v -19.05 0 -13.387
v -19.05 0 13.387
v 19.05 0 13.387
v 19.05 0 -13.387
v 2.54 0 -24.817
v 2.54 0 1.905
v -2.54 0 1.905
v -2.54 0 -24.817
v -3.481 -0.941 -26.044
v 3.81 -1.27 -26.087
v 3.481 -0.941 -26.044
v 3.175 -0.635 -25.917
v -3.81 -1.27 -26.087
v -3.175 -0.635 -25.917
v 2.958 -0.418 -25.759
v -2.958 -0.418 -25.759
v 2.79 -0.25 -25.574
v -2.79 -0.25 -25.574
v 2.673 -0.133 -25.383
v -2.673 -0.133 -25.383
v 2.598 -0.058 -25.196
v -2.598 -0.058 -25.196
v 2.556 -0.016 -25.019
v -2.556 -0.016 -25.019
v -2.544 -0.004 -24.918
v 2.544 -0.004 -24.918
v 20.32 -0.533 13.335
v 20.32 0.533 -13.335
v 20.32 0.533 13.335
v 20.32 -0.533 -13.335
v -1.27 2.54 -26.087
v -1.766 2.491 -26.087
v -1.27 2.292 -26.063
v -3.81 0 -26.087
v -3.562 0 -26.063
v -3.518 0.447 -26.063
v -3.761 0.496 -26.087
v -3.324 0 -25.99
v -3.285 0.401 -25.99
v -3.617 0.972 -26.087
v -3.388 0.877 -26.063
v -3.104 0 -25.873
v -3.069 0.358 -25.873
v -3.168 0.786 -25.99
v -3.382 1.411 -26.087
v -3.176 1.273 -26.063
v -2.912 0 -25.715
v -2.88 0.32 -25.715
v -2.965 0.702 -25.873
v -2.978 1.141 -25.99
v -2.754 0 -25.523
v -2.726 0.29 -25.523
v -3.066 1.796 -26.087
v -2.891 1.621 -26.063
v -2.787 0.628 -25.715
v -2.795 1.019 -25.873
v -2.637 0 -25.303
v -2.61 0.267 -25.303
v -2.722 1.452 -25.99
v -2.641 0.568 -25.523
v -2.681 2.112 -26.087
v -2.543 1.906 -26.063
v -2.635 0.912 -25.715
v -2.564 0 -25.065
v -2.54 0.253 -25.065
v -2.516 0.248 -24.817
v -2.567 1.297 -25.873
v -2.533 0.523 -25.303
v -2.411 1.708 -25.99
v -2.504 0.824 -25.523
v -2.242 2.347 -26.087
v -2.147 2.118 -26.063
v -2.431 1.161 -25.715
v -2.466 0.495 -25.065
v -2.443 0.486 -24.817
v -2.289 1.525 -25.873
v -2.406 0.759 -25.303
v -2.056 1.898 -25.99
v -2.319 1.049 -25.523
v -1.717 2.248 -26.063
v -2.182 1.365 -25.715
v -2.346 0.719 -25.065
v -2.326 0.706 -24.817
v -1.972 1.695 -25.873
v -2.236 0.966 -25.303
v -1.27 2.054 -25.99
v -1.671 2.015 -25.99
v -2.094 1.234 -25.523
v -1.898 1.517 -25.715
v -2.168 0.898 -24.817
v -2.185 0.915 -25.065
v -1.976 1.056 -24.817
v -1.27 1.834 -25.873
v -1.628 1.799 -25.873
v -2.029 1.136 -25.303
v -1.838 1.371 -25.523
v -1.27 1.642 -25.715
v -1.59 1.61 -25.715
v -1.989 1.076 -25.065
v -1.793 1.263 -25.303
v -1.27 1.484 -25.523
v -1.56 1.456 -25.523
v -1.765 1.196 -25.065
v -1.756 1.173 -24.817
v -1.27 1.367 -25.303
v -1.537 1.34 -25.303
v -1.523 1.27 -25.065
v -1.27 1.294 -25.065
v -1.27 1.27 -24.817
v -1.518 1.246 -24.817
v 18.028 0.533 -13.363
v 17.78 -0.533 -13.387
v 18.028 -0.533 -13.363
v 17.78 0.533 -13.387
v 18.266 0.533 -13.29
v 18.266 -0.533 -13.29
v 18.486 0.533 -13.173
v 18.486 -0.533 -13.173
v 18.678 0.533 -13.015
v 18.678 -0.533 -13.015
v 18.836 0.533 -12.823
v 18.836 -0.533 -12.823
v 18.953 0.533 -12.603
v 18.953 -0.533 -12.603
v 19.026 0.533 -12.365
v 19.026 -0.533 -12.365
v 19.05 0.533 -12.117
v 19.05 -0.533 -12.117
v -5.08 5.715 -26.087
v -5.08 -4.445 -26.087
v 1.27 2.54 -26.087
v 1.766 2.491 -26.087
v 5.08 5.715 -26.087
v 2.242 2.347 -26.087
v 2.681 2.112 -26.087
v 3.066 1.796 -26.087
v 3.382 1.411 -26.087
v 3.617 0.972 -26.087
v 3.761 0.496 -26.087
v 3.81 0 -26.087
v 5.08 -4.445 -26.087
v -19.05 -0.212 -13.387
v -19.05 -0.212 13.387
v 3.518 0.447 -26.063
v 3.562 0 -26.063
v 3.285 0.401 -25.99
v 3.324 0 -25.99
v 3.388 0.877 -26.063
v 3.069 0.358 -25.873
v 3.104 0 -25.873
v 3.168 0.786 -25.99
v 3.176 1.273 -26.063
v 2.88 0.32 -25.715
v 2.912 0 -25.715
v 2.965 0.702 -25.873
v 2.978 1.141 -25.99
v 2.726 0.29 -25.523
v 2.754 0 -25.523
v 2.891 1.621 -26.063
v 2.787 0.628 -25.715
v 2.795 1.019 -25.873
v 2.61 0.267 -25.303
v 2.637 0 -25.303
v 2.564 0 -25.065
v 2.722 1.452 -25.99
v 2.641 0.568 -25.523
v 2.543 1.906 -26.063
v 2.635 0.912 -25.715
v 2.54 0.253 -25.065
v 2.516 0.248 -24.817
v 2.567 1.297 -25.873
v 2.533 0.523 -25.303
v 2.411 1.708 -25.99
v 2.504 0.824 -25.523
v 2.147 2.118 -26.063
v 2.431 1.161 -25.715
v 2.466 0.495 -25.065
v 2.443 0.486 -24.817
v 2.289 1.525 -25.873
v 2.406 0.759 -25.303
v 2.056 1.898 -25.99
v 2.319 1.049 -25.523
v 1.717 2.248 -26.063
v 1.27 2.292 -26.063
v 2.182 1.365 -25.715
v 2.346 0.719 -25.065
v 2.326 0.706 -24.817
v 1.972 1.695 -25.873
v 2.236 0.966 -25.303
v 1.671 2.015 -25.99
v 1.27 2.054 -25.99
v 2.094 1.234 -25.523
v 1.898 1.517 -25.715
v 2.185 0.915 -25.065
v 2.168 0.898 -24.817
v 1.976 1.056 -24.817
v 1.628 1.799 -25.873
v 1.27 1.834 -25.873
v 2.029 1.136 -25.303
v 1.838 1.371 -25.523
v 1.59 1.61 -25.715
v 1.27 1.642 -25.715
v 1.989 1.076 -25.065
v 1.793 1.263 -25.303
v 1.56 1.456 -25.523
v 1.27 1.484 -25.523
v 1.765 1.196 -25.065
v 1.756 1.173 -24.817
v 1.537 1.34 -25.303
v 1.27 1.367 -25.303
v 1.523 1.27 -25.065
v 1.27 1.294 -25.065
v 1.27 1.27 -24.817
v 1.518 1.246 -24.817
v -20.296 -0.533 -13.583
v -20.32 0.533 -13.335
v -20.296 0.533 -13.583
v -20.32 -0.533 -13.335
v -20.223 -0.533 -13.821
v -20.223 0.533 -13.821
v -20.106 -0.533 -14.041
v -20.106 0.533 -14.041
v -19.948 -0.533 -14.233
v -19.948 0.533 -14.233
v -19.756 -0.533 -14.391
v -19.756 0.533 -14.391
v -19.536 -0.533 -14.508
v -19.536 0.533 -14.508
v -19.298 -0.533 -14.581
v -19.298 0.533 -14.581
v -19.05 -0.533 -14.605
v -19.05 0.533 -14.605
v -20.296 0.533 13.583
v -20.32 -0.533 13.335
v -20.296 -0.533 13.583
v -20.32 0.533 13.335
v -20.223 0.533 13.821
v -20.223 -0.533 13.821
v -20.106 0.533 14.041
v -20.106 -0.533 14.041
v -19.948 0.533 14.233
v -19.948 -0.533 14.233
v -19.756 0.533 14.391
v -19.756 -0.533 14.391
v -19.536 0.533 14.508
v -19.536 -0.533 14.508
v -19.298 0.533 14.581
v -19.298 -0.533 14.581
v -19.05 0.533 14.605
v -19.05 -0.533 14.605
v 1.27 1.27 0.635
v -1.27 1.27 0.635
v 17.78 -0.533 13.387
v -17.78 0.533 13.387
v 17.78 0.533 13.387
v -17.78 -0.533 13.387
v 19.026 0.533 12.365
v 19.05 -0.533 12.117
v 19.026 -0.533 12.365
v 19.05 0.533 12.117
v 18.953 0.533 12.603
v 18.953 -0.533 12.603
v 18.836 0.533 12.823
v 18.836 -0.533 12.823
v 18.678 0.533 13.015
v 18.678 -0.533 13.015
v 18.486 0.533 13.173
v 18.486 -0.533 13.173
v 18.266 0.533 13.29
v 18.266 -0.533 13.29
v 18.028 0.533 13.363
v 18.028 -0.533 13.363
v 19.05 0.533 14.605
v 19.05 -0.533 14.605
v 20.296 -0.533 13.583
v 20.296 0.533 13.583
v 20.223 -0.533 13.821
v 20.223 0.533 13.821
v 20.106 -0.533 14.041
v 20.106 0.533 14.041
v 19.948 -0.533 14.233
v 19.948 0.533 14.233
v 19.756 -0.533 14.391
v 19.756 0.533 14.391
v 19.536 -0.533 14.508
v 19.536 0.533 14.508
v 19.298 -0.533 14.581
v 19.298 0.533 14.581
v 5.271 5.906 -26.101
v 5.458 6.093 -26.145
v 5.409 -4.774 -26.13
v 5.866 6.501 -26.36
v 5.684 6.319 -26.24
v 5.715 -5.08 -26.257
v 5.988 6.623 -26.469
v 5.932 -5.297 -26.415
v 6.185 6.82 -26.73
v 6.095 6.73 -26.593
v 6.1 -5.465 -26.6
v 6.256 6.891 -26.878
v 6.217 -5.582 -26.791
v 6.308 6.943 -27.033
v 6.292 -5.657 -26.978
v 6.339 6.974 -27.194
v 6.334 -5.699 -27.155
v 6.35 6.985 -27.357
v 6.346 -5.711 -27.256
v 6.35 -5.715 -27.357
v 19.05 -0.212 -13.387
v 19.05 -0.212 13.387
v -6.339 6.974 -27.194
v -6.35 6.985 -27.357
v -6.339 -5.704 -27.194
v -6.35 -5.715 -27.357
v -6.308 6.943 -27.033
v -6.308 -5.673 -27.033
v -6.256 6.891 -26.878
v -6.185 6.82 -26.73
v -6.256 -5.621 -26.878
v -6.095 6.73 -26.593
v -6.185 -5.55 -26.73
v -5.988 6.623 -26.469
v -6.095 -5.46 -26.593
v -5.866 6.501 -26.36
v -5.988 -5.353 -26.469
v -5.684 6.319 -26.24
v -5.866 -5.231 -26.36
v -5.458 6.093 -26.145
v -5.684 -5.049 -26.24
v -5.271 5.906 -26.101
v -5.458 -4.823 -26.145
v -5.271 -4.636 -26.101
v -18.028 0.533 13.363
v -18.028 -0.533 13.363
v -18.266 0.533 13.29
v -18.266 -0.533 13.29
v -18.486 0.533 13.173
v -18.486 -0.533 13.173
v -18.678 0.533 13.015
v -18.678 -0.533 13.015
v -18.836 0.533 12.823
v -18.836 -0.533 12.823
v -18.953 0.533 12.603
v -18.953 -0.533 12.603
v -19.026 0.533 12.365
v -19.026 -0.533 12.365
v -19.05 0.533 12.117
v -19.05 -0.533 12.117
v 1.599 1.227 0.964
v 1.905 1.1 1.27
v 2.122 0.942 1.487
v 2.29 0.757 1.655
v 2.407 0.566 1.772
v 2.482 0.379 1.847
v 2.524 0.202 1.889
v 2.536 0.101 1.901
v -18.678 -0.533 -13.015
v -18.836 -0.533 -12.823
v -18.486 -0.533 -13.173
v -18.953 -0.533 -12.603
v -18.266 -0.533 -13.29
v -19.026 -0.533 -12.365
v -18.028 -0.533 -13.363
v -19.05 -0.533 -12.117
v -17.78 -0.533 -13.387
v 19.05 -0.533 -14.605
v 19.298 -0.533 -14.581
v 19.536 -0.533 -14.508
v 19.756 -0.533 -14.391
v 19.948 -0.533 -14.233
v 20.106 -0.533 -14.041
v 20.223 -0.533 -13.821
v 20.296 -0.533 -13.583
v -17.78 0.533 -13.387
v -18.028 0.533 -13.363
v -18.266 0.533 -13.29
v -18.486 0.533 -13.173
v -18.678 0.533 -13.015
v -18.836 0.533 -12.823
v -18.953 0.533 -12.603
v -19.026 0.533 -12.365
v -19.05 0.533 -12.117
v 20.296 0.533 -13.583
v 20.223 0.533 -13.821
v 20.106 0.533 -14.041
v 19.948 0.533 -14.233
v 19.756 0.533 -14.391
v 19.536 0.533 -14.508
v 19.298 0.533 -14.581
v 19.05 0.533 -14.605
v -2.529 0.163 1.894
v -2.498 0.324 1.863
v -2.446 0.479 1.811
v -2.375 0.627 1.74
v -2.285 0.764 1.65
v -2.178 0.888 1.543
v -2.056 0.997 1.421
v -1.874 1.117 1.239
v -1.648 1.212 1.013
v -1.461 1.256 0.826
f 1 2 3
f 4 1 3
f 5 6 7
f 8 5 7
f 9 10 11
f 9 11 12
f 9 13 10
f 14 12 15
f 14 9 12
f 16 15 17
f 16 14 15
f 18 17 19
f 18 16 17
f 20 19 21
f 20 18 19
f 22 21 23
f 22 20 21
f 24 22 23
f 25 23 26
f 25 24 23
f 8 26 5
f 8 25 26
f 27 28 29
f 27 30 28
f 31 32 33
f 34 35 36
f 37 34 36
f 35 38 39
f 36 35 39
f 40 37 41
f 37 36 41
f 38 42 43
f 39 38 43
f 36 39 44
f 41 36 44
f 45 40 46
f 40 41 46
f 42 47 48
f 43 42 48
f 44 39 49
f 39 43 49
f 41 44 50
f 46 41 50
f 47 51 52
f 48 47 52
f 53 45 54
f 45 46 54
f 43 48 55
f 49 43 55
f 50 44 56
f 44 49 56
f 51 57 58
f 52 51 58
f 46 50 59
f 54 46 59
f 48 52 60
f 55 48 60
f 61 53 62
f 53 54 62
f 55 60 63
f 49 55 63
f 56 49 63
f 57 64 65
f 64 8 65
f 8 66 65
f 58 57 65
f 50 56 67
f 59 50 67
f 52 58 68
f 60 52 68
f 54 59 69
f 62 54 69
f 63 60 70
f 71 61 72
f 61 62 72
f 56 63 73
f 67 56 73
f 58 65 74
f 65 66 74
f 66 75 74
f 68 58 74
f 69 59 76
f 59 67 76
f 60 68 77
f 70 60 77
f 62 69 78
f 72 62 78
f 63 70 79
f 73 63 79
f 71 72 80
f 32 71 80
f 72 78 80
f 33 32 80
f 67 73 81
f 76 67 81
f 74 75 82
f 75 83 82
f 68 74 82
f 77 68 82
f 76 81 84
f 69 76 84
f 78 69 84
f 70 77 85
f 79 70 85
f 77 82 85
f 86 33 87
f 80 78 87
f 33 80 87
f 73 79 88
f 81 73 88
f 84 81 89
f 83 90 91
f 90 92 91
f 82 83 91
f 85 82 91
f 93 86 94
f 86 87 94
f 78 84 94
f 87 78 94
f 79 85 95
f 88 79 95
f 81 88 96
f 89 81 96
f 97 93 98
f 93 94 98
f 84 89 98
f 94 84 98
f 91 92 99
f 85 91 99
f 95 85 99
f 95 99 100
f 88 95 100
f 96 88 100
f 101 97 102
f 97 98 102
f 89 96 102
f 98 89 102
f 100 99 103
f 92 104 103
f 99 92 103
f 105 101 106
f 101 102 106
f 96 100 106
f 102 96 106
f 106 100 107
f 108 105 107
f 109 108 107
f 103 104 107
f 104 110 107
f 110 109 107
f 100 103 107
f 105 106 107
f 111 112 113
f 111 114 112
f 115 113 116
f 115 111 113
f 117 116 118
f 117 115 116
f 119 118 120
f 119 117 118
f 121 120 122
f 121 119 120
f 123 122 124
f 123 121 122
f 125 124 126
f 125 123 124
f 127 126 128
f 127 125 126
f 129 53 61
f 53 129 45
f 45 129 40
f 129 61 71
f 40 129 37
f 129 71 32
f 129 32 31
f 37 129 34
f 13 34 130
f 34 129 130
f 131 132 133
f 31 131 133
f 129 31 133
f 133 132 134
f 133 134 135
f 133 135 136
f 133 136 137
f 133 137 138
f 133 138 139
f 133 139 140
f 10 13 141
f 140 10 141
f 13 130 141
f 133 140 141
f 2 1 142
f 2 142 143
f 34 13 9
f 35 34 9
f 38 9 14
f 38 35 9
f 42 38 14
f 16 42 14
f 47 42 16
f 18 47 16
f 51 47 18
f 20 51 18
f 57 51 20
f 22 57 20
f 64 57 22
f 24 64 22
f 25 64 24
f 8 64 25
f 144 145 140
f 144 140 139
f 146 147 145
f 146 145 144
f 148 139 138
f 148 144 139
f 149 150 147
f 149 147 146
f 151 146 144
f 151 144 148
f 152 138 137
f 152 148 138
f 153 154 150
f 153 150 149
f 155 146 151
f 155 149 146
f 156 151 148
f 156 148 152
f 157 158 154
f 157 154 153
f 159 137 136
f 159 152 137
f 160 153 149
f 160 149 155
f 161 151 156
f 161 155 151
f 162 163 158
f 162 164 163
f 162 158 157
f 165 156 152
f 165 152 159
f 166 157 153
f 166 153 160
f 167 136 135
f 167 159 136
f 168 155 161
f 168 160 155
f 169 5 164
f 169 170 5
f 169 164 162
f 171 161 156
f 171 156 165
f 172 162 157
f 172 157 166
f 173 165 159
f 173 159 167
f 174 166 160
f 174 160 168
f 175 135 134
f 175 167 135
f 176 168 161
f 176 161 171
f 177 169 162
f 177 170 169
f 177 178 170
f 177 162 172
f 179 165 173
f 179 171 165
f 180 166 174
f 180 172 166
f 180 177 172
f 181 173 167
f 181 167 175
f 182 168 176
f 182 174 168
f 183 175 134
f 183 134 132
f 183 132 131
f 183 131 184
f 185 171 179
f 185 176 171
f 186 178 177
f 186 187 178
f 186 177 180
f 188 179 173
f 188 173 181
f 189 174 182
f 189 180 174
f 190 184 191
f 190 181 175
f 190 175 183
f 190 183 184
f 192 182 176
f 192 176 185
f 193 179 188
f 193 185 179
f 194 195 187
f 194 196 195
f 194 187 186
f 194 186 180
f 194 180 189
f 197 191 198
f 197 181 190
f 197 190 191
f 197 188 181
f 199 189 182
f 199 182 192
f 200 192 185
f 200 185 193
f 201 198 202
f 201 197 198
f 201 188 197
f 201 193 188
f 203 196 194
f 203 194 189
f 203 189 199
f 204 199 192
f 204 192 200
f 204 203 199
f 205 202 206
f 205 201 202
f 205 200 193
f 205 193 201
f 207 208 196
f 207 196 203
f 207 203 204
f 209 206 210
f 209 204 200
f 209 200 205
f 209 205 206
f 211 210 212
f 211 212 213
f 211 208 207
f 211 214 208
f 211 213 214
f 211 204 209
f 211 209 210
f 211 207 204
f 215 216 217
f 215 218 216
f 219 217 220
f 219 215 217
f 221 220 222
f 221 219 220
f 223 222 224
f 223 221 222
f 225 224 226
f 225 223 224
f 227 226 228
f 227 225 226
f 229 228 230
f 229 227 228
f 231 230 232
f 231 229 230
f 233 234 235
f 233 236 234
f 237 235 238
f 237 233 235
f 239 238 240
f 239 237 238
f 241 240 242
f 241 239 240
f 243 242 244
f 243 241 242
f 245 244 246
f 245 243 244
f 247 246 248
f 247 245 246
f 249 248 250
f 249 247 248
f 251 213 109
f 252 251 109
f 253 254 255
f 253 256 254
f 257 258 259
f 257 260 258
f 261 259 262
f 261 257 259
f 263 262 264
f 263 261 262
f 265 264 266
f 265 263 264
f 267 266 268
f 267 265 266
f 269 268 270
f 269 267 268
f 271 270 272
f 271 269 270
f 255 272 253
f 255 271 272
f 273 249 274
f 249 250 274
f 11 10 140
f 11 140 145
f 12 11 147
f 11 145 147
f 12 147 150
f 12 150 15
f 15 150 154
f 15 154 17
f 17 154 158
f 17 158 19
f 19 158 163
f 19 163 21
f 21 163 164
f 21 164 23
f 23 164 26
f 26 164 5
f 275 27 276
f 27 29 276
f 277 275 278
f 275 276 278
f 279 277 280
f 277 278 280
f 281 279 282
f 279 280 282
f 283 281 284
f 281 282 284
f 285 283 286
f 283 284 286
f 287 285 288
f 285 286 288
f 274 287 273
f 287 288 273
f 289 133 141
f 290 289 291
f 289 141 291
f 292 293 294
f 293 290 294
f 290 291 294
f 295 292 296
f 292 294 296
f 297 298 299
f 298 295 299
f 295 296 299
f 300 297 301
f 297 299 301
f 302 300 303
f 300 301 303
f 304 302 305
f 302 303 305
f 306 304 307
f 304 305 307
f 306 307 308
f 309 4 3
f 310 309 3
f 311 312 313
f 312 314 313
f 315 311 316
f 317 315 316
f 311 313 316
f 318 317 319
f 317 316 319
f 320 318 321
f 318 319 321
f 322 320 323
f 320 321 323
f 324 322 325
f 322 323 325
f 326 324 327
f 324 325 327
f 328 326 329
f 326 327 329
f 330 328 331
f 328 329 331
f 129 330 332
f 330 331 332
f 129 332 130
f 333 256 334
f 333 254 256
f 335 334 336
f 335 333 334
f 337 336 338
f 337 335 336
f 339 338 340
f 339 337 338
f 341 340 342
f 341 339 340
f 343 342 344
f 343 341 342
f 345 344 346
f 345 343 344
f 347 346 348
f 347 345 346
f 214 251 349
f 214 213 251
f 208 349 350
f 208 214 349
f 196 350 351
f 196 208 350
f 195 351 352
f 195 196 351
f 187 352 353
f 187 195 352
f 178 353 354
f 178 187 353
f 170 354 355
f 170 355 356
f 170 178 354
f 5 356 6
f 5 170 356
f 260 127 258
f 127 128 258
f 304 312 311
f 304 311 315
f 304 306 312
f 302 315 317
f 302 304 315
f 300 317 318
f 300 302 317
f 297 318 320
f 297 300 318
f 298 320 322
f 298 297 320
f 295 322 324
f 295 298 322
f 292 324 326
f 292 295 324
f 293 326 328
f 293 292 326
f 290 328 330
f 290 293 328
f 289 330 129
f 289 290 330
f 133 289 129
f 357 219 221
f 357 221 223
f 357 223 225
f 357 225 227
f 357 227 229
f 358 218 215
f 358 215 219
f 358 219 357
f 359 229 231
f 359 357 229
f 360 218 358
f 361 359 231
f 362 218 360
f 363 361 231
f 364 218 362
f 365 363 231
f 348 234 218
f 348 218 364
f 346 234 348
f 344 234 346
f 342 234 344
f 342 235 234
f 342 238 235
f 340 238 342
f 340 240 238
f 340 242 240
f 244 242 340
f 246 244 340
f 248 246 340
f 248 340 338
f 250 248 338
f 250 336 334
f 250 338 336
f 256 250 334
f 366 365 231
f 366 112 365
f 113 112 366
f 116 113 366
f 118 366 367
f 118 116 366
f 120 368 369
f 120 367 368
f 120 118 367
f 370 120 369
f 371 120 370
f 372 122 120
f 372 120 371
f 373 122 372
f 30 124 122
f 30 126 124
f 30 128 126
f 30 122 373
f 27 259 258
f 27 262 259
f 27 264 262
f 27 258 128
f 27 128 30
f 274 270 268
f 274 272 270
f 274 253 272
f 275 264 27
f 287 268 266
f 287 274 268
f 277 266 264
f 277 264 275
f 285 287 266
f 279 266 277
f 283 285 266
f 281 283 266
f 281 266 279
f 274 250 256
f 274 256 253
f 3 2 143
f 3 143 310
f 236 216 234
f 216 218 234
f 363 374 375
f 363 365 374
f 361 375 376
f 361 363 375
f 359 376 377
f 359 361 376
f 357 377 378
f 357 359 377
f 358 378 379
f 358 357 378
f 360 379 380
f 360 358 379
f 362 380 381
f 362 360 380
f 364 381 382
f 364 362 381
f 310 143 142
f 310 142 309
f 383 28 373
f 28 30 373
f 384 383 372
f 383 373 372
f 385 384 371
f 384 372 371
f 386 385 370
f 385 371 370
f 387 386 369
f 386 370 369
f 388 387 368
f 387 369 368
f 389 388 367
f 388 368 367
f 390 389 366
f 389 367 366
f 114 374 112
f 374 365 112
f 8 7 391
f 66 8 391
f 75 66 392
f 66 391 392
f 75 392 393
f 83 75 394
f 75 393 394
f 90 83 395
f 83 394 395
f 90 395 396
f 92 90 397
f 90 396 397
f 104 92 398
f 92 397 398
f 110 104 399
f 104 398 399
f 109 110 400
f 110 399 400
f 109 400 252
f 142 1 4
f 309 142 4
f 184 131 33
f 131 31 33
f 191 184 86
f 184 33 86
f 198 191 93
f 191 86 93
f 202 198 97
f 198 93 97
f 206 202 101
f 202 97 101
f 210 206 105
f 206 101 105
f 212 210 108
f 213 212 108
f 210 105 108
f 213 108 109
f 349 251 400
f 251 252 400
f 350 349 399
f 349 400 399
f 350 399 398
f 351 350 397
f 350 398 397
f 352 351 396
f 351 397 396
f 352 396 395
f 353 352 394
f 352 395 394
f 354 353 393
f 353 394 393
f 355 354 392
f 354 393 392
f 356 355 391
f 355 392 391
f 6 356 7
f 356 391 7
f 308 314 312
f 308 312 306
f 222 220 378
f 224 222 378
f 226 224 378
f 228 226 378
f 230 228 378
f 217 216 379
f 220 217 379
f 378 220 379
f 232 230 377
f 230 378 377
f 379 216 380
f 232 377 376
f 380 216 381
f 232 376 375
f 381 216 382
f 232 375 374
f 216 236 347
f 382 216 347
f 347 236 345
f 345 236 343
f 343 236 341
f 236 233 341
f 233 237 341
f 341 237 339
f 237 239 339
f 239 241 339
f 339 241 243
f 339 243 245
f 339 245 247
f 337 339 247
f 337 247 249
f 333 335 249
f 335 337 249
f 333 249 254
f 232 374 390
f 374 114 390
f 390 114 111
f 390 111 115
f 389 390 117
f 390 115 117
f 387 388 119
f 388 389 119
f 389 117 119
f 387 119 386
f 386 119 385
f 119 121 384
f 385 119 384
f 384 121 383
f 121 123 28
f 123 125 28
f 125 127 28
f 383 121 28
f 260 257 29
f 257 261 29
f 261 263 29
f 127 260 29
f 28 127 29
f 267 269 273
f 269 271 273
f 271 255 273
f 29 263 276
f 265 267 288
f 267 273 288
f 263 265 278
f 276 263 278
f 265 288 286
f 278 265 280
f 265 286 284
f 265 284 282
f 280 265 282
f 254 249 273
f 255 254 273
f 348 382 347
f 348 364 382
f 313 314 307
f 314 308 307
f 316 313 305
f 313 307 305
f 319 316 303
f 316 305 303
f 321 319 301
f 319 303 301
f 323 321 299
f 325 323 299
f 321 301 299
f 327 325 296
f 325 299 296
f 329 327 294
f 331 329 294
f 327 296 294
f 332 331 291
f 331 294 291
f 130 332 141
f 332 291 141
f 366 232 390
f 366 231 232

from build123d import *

# Parameters (mm, degrees)
F0_W     = 38.1
F0_H     = 26.7739508559
F1_DEPTH = 0.2116666666
F0_W_2   = 40.64
F0_H_2   = 29.21
F2_DEPTH = 0.5334
F3_W     = 5.08
F3_H     = 3.81
F3_H_2   = 11.481975428
F3_H_3   = 12.7
F4_DEPTH = 1.27
F5_W     = 12.7
F5_H     = 12.7
F6_DEPTH = 1.27
F7_R     = 1.26999
F7_2_R   = 1.26999
F8_R     = 1.27


# Not quite as in the source:
# - a fillet or chamfer is up to 0.001 mm smaller than in the source, because OpenCascade refuses the exact size


with BuildPart() as f1:
    # F0 (on Front) → F1 (new body)
    with BuildSketch(Plane.XZ):
        Rectangle(F0_W, F0_H)
    extrude(amount=F1_DEPTH)


with BuildPart() as f2:
    # F0 (on Front) → F2 (new body, symmetric)
    with BuildSketch(Plane.XZ):
        Rectangle(F0_W_2, F0_H_2)
        Rectangle(F0_W, F0_H, mode=Mode.SUBTRACT)
    extrude(amount=F2_DEPTH, both=True)

    # F7#2 (radius 1.27 in the source; OpenCascade refuses exactly that, so slightly less here)
    f7_2_edges = [f2.edges().sort_by_distance(p)[0] for p in [
        (-20.32, 0, -14.605),
        (20.32, 0, -14.605),
        (-20.32, 0, 14.605),
        (20.32, 0, 14.605),
    ]]
    fillet(f7_2_edges, radius=F7_2_R)

    # F8
    f8_edges = [f2.edges().sort_by_distance(p)[0] for p in [
        (-19.05, 0, 13.386975),
        (19.05, 0, 13.386975),
        (-19.05, 0, -13.386975),
        (19.05, 0, -13.386975),
    ]]
    fillet(f8_edges, radius=F8_R)


with BuildPart() as f4:
    # F3 (on face) → F4 (new body)
    with BuildSketch(Plane(origin=(0, 0, 0), x_dir=(-1, 0, 0), z_dir=(0, 1, 0))):
        Rectangle(F3_W, F3_H)
        with Locations((0, -7.645987714)):
            Rectangle(F3_W, F3_H_2)
        with Locations((0, -19.736975428)):
            Rectangle(F3_W, F3_H_3)
    extrude(amount=F4_DEPTH)

    # F5 (on face) → F6 (join)
    with BuildSketch(Plane(origin=(0, 0, -26.086975428), x_dir=(1, 0, 0), z_dir=(0, 0, -1))):
        with Locations((0, -0.635)):
            Rectangle(F5_W, F5_H)
    extrude(amount=F6_DEPTH)

    # F7 (radius 1.27 in the source; OpenCascade refuses exactly that, so slightly less here)
    f7_edges = [f4.edges().sort_by_distance(p)[0] for p in [
        (0, 0, -26.086975),
        (-2.54, 0.635, -26.086975),
        (2.54, 0.635, -26.086975),
        (0, 1.27, -26.086975),
        (0, 6.985, -26.086975),
        (6.35, 0.635, -26.086975),
        (0, -5.715, -26.086975),
        (-6.35, 0.635, -26.086975),
        (2.54, 1.27, -12.090988),
        (-2.54, 1.27, -12.090988),
        (0, 1.27, 1.905),
    ]]
    fillet(f7_edges, radius=F7_R)


solid = Compound([f1.part, f2.part, f4.part])
